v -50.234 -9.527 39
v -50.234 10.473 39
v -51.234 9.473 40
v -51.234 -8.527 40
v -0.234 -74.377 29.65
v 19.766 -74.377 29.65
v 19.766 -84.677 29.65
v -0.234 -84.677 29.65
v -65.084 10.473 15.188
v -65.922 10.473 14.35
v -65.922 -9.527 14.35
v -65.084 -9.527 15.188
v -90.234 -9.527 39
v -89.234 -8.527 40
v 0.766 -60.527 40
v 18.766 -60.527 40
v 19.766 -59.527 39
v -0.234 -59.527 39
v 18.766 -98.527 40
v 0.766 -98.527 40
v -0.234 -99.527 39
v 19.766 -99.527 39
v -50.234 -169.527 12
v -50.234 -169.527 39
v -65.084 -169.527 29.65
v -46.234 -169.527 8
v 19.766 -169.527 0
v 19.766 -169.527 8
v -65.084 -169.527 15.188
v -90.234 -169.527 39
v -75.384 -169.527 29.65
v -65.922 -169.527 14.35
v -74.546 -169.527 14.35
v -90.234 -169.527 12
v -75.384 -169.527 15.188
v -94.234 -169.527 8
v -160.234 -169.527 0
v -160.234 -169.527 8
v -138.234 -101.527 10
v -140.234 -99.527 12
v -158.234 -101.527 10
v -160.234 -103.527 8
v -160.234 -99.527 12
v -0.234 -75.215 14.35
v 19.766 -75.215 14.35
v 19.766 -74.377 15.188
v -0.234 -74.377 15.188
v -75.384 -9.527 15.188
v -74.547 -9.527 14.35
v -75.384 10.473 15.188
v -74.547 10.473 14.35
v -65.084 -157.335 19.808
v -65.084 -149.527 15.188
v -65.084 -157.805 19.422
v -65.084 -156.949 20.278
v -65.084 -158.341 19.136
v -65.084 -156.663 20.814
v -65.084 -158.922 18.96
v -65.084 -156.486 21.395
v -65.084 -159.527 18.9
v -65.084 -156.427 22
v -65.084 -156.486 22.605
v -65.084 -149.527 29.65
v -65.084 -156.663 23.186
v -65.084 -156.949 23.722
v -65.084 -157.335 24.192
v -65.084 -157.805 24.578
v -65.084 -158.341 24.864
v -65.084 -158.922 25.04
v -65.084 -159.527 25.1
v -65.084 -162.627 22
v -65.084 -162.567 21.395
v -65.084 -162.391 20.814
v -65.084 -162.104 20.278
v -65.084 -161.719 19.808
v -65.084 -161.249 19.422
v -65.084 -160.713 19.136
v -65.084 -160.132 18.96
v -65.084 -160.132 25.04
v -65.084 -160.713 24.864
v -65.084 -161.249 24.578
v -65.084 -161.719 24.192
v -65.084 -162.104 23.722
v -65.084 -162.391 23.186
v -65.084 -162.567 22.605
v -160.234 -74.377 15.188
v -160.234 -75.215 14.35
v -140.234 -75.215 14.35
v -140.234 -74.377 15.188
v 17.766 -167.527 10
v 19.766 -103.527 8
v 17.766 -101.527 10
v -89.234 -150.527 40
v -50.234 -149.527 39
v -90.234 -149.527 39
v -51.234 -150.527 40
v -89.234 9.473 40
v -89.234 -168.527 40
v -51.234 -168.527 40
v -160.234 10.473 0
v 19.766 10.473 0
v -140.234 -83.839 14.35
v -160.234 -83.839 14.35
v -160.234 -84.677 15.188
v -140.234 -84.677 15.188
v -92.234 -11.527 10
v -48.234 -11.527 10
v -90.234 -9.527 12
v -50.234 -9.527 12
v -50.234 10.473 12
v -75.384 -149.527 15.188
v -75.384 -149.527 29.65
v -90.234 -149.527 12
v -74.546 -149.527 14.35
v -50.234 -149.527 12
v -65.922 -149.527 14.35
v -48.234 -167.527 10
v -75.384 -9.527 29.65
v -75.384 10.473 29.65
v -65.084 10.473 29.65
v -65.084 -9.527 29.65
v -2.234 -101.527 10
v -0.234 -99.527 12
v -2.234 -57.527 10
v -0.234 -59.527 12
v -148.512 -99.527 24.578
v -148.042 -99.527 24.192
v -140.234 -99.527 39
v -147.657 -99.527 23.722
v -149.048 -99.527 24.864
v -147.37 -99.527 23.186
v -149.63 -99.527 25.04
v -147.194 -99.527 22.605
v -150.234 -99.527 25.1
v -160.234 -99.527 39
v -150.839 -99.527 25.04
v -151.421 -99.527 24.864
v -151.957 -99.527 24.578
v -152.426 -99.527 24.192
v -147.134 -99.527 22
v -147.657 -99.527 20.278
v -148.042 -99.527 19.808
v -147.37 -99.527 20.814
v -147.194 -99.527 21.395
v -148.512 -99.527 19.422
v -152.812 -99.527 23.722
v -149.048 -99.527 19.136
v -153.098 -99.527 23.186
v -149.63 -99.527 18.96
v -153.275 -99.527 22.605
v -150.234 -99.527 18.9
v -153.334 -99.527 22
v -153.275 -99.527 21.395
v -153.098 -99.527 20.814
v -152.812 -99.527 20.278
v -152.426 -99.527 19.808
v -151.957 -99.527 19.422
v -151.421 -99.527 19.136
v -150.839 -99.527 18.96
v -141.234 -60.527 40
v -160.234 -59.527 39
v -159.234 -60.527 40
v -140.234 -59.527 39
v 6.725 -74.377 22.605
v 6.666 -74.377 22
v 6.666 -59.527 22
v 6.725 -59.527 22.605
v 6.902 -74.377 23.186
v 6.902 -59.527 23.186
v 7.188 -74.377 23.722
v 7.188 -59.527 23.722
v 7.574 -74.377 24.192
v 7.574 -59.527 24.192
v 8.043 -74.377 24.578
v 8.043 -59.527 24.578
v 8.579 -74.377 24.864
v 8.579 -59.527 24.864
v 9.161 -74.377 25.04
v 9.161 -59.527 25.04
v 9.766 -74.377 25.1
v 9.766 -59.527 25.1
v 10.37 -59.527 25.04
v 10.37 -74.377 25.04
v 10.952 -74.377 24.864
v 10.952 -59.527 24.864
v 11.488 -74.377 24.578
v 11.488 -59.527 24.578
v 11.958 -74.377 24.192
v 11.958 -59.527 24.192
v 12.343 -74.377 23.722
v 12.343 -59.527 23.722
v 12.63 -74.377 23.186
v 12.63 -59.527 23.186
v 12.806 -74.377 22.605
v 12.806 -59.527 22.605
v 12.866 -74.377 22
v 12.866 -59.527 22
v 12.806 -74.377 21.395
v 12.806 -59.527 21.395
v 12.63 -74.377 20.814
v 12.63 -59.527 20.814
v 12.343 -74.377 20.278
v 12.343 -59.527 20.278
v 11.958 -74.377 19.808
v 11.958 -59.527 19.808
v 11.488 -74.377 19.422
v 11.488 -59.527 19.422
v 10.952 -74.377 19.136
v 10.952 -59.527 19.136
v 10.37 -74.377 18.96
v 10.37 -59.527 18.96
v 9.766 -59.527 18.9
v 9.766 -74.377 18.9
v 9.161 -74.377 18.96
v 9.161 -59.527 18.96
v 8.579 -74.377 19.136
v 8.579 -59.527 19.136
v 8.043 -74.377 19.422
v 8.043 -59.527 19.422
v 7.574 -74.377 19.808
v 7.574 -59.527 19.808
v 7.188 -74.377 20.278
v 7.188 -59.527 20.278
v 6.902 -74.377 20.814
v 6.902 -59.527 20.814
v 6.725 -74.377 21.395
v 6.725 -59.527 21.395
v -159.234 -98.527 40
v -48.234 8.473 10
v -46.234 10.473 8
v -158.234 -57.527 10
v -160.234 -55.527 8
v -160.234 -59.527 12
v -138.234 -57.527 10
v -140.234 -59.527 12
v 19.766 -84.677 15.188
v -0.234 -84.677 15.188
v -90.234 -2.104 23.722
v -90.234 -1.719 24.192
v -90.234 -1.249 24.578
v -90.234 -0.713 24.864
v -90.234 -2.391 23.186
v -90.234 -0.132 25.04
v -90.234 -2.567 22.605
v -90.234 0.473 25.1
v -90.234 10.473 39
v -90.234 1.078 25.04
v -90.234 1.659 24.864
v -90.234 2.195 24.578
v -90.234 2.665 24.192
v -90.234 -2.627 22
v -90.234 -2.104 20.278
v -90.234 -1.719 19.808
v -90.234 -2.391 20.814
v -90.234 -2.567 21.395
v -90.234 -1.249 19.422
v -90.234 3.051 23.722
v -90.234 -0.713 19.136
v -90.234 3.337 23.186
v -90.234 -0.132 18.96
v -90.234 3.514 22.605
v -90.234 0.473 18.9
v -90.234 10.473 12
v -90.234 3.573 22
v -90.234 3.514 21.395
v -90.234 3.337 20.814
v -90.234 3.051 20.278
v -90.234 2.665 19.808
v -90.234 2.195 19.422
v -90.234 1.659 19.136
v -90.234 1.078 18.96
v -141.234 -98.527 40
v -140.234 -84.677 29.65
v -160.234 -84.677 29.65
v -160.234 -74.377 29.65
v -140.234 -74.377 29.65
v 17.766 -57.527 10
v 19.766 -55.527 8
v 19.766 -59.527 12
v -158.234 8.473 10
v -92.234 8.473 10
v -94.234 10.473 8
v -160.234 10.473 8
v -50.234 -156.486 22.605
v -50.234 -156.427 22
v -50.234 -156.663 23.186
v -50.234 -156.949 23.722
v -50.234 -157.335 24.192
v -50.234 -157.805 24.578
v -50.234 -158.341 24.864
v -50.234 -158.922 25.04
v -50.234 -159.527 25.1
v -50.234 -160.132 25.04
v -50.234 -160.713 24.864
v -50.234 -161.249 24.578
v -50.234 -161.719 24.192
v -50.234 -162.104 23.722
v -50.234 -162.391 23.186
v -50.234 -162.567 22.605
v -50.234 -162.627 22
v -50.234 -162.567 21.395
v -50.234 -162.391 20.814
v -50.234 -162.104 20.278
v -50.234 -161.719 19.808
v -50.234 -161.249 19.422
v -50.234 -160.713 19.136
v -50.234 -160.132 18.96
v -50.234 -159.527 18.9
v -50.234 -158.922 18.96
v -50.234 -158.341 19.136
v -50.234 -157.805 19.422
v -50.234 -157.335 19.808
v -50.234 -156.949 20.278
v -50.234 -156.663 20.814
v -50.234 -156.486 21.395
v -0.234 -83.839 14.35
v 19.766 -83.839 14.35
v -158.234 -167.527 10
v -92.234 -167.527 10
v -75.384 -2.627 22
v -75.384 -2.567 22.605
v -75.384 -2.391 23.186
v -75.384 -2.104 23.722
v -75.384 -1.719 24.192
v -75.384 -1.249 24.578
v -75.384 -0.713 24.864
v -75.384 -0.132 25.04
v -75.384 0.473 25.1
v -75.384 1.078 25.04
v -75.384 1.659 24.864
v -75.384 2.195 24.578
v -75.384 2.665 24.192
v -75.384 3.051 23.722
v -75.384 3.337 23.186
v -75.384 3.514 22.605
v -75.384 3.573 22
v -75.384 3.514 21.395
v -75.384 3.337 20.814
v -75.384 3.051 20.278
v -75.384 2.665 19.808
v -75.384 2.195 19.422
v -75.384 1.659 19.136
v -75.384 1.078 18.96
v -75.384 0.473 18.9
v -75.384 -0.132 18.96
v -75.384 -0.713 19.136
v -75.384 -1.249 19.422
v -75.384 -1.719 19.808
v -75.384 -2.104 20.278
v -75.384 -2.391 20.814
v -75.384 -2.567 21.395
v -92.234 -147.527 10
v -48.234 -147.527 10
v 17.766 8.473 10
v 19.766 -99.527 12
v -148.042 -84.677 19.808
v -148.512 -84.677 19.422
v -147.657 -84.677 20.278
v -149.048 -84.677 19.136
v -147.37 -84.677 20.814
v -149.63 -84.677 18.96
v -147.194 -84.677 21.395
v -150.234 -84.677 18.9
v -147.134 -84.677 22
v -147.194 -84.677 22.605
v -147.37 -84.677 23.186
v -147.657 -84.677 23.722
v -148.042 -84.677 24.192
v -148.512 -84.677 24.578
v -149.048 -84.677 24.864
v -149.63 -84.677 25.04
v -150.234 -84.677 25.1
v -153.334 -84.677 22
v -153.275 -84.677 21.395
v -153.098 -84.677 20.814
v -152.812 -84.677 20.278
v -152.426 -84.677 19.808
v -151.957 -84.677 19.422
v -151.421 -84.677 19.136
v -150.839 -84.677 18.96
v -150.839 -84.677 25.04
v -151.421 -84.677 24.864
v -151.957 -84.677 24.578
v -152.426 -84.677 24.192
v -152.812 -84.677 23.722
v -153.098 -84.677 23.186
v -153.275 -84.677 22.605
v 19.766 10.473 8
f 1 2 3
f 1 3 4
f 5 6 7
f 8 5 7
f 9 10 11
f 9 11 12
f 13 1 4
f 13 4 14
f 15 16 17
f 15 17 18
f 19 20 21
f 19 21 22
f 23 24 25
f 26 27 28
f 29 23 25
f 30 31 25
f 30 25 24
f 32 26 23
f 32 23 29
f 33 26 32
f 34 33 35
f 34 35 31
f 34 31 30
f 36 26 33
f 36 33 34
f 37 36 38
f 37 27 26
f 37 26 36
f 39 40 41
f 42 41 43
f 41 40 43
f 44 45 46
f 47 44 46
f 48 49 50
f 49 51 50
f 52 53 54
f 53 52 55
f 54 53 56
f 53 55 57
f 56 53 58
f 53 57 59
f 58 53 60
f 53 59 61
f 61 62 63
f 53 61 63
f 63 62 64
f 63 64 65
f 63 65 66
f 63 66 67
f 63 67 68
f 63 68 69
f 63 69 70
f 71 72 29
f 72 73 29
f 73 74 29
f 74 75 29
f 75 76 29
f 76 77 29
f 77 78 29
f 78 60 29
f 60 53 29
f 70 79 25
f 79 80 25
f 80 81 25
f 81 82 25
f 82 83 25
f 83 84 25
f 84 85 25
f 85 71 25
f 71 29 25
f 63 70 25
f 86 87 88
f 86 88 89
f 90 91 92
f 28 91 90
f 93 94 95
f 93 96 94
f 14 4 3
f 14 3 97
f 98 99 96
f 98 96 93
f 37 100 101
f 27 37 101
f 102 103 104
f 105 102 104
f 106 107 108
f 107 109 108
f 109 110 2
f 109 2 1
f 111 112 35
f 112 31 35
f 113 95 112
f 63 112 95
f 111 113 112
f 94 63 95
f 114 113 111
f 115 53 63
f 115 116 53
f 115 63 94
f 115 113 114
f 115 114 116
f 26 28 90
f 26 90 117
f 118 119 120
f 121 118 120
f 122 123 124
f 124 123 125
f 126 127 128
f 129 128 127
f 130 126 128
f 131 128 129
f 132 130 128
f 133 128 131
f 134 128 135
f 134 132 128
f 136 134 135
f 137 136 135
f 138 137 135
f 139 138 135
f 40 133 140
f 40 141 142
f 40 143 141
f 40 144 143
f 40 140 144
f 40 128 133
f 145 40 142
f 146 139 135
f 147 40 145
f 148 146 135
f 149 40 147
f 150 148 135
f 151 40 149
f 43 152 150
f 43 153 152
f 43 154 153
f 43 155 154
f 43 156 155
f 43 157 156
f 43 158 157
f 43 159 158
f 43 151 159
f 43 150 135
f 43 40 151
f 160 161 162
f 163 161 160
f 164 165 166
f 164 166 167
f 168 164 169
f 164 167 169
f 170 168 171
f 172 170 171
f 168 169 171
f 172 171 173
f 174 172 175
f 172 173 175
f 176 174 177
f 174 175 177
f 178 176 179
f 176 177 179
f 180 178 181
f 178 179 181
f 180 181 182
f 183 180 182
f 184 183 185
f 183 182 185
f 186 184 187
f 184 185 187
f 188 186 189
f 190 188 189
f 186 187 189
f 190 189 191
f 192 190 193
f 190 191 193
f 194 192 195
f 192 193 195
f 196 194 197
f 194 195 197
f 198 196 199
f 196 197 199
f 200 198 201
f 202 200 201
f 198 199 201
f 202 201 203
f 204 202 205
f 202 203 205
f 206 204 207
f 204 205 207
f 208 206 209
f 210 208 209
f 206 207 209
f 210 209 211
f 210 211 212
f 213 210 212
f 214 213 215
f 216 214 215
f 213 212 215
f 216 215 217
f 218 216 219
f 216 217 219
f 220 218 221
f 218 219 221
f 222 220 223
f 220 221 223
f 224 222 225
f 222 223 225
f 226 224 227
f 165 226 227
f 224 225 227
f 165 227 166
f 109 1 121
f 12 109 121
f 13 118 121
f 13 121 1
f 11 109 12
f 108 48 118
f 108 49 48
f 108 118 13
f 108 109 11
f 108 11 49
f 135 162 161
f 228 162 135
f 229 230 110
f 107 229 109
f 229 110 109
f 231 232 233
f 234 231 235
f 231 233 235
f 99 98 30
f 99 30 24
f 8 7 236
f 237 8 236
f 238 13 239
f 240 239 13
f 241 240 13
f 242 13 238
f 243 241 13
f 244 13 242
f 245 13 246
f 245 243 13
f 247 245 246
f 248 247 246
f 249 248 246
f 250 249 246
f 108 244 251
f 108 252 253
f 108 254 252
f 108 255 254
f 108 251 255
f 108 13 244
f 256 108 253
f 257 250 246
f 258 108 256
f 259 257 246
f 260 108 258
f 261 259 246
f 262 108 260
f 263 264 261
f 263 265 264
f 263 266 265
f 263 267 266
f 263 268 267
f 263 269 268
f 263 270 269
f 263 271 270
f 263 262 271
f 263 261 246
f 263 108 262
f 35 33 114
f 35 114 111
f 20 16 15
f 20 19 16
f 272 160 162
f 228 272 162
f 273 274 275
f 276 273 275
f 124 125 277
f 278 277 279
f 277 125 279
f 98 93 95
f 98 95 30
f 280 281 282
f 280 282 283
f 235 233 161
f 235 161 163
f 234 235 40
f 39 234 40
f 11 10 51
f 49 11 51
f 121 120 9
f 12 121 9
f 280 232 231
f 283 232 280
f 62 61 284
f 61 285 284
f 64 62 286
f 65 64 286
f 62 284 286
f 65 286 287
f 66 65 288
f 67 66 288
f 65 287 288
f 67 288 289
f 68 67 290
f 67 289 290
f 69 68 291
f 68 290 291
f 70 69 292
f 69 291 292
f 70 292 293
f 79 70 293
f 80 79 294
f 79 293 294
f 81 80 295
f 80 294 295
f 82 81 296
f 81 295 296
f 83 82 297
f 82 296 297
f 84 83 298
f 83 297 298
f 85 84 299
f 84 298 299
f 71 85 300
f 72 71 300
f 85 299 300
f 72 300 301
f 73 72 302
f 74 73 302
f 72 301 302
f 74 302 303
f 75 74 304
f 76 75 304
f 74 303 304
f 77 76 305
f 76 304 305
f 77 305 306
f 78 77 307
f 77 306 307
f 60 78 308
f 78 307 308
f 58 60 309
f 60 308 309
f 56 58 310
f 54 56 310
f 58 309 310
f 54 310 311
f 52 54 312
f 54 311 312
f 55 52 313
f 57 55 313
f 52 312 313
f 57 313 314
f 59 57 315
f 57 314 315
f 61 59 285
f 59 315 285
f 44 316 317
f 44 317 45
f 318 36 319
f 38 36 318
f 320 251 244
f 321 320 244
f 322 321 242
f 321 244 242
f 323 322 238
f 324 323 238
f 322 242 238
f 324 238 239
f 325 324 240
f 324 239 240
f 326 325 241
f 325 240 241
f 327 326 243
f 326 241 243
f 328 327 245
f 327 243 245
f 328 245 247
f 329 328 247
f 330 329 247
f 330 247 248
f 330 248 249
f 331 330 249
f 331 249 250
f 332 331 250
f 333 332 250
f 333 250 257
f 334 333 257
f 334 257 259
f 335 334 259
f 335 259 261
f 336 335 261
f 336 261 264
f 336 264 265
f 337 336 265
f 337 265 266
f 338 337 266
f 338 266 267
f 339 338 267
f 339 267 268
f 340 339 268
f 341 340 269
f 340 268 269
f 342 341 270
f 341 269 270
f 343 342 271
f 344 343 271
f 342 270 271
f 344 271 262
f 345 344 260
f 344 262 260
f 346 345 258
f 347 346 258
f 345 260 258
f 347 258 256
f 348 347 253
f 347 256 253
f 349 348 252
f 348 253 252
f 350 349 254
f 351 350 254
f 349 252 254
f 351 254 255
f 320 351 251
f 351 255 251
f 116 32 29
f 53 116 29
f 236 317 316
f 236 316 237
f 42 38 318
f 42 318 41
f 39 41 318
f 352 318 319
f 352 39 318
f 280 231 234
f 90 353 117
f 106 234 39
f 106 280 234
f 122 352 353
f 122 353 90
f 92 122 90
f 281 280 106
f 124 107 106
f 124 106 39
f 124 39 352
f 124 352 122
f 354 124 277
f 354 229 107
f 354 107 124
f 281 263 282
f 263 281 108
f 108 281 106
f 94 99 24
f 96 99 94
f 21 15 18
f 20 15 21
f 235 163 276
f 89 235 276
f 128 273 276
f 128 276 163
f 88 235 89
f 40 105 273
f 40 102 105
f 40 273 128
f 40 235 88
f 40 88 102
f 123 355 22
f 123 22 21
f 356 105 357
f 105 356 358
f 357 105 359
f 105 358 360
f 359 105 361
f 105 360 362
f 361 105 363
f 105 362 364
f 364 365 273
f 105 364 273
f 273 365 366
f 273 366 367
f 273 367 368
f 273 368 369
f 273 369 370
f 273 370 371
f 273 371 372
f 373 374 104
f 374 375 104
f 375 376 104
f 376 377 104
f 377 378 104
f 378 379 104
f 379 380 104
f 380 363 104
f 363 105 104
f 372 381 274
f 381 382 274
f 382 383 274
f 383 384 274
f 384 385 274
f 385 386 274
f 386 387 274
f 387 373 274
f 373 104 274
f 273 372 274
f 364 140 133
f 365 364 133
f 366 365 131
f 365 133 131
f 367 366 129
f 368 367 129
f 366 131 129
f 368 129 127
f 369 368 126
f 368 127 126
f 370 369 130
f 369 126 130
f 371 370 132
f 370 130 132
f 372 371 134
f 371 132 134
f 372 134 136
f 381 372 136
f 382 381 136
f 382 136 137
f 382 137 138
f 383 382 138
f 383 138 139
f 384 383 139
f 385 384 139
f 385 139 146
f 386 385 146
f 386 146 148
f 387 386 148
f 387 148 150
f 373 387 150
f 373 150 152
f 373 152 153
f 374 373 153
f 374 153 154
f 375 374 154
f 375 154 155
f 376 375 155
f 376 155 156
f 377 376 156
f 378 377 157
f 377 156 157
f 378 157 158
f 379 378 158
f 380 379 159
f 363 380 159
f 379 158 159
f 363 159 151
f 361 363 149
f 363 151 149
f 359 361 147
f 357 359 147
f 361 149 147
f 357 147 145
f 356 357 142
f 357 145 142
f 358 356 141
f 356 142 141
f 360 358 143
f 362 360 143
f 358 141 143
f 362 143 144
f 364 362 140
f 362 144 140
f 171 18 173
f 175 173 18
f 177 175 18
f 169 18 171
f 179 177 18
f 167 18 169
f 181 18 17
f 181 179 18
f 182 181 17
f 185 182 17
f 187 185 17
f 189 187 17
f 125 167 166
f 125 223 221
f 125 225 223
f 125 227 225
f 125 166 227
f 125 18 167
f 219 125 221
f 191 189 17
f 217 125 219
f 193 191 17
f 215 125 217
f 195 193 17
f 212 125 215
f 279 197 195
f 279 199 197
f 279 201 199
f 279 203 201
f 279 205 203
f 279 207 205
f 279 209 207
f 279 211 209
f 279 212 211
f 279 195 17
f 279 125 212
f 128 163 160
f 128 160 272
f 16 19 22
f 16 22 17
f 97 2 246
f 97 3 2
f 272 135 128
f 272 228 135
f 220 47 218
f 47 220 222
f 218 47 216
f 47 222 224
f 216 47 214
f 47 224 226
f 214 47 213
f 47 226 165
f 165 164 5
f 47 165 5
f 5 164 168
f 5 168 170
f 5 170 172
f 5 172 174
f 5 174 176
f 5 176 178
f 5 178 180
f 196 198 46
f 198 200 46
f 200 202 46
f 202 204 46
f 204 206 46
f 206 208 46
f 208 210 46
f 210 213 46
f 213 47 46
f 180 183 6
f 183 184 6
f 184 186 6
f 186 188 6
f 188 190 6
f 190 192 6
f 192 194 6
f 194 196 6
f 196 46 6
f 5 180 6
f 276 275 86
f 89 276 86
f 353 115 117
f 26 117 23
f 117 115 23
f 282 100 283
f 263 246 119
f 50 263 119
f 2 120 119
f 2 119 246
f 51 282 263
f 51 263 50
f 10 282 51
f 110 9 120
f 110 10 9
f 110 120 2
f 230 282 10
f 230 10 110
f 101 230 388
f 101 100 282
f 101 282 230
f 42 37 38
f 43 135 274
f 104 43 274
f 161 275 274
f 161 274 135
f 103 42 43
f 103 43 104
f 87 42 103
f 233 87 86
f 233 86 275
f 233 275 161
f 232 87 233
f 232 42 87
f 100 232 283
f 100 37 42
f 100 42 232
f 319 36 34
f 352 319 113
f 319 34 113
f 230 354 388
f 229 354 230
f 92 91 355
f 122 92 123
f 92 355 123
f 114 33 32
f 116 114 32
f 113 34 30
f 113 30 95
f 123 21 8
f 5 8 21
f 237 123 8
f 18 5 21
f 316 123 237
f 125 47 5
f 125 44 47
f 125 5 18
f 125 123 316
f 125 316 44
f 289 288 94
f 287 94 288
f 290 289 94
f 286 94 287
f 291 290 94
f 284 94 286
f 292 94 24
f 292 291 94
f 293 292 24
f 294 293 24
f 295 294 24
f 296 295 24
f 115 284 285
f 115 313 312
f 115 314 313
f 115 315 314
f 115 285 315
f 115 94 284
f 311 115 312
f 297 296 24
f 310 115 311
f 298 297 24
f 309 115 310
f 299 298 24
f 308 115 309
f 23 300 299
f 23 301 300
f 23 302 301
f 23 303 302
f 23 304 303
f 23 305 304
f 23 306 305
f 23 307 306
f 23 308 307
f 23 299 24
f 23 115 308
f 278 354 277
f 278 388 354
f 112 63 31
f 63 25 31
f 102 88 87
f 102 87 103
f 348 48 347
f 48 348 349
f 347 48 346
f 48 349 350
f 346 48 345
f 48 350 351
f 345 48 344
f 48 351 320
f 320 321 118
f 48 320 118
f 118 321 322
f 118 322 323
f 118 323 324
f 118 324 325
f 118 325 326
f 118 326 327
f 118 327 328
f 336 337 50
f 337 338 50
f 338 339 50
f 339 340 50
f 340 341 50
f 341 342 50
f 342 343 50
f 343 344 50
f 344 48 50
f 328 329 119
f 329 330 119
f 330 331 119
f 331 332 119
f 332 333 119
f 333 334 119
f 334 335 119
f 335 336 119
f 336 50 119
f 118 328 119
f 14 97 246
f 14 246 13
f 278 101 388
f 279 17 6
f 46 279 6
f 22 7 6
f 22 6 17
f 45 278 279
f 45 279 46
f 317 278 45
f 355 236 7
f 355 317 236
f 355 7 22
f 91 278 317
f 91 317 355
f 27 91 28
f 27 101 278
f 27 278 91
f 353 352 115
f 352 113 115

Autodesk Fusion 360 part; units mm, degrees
sketch "Sketch1" plane through (0, 0, 0) normal (0, 0, 1) x (1, 0, 0)
  line L0 (-160.2344, 10.4731) -> (19.7656, 10.4731)
  line L1 (19.7656, 10.4731) -> (19.7656, -169.5269)
  line L2 (19.7656, -169.5269) -> (-160.2344, -169.5269)
  line L3 (-160.2344, -169.5269) -> (-160.2344, 10.4731)
  dimension "d1" = 180
  dimension "d2" = 180
extrude "Extrude1" add sketch "Sketch1" along normal blind 10
sketch "Sketch2" plane through (0, 0, 10) normal (0, 0, 1) x (-1, 0, 0)
  line L0 (160.2344, 169.5269) -> (-19.7656, 169.5269)
  line L1 (-19.7656, 169.5269) -> (-19.7656, -10.4731)
  line L2 (-19.7656, -10.4731) -> (160.2344, -10.4731)
  line L3 (160.2344, -10.4731) -> (160.2344, 169.5269)
  line L4 (160.2344, 59.5269) -> (140.2344, 59.5269)
  line L5 (140.2344, 59.5269) -> (140.2344, 99.5269)
  line L6 (140.2344, 99.5269) -> (160.2344, 99.5269)
  line L7 (160.2344, 99.5269) -> (160.2344, 59.5269)
  line L8 (0.2344, 59.5269) -> (-19.7656, 59.5269)
  line L9 (-19.7656, 59.5269) -> (-19.7656, 99.5269)
  line L10 (-19.7656, 99.5269) -> (0.2344, 99.5269)
  line L11 (0.2344, 99.5269) -> (0.2344, 59.5269)
  line L12 (90.2344, -10.4731) -> (50.2344, -10.4731)
  line L13 (50.2344, -10.4731) -> (50.2344, 9.5269)
  line L14 (50.2344, 9.5269) -> (90.2344, 9.5269)
  line L15 (90.2344, 9.5269) -> (90.2344, -10.4731)
  line L16 (90.2344, 149.5269) -> (50.2344, 149.5269)
  line L17 (50.2344, 149.5269) -> (50.2344, 169.5269)
  line L18 (50.2344, 169.5269) -> (90.2344, 169.5269)
  line L19 (90.2344, 169.5269) -> (90.2344, 149.5269)
  dimension "d5" = 20
  dimension "d6" = 20
  dimension "d7" = 20
  dimension "d8" = 20
  dimension "d9" = 40
  dimension "d10" = 40
  dimension "d11" = 40
  dimension "d12" = 40
  dimension "d13" = 70
  dimension "d14" = 70
  dimension "d15" = 70
  dimension "d16" = 70
extrude "Extrude2" add sketch "Sketch2" along normal blind 30 contours L0 L16 L17 L18 L19 | L3 L4 L5 L6 L7 | L1 L8 L9 L10 L11 | L2 L12 L13 L14 L15
sketch "Sketch3" plane through (19.7656, 0, 0) normal (1, 0, 0) x (0, 1, 0)
  line L0 (-169.5269, 0) -> (10.4731, 0)
  line L1 (10.4731, 0) -> (10.4731, 10)
  line L2 (10.4731, 10) -> (-59.5269, 10)
  line L3 (-59.5269, 10) -> (-59.5269, 40)
  line L4 (-59.5269, 40) -> (-99.5269, 40)
  line L5 (-99.5269, 40) -> (-99.5269, 10)
  line L6 (-99.5269, 10) -> (-169.5269, 10)
  line L7 (-169.5269, 10) -> (-169.5269, 0)
  circle A0 centre (-79.5269, 22) radius 6 construction
  line L8 (-74.5269, 29.5) -> (-84.5269, 29.5) construction
  line L9 (-84.5269, 29.5) -> (-84.5269, 15.25) construction
  line L10 (-83.7769, 14.5) -> (-75.2769, 14.5) construction
  line L11 (-74.5269, 15.25) -> (-74.5269, 29.5) construction
  line L12 (-74.5269, 29.5) -> (-84.5269, 14.5) construction
  line L13 (-84.5269, 29.5) -> (-74.5269, 14.5) construction
  line L14 (-83.7769, 14.5) -> (-84.5269, 15.25)
  line L15 (-75.2769, 14.5) -> (-74.5269, 15.25)
  line L16 (-83.839, 14.35) -> (-75.2147, 14.35)
  line L17 (-75.2147, 14.35) -> (-74.3769, 15.1879)
  line L18 (-74.3769, 15.1879) -> (-74.3769, 29.65)
  line L19 (-74.3769, 29.65) -> (-84.6769, 29.65)
  line L20 (-84.6769, 29.65) -> (-84.6769, 15.1879)
  line L21 (-83.839, 14.35) -> (-84.6769, 15.1879)
  point P0 (-79.5269, 22)
  dimension "d19" = 12
  dimension "d20" = 18
  dimension "d21" = 20
  dimension "d36" = 10
  dimension "d37" = 15
  dimension "d38" = 0.15
  dimension "d39" = 0.75
  dimension "d40" = 0.75
  dimension "d41" = 0.75
  dimension "d42" = 0.75
extrude "Extrude3" cut sketch "Sketch3" against normal blind 30 contours L16 L17 L18 L19 L20 L21
ref_plane "WorkPlane1" through (-70.2344, -79.5269, 20) normal (0, -1, 0) x (1, 0, 0)
ref_plane "WorkPlane2" through (-70.2344, -79.5269, 20) normal (1, 0, 0) x (0, 1, 0)
pattern_circular "C-Pattern1" count 4 over 360 about axis through (-70.2344, -79.5269, -13.6) along (0, 0, 1) of "Extrude3"
sketch "Sketch4" plane through (0, -59.5269, 0) normal (0, 1, 0) x (-1, 0, 0)
  line L0 (-19.7656, 10) -> (0.2344, 10)
  line L1 (0.2344, 10) -> (0.2344, 40)
  line L2 (0.2344, 40) -> (-19.7656, 40)
  line L3 (-19.7656, 40) -> (-19.7656, 10)
  circle A0 centre (-9.7656, 22) radius 3.1
  dimension "d26" = 6.2
  dimension "d27" = 18
  dimension "d28" = 10
extrude "Extrude4" cut sketch "Sketch4" against normal blind 20 contours A0
pattern_circular "C-Pattern2" count 4 over 360 about axis through (-70.2344, -79.5269, -13.6) along (0, 0, 1) of "Extrude4"
chamfer "Chamfer1" distance 1 angle 45 16 edges at (-0.2344, -79.5269, 40) (9.7656, -99.5269, 40) (19.7656, -79.5269, 40) (9.7656, -59.5269, 40) (-70.2344, 10.4731, 40) (-70.2344, -9.5269, 40) (-50.2344, 0.4731, 40) (-90.2344, 0.4731, 40) (-150.2344, -59.5269, 40) (-140.2344, -79.5269, 40) (-160.2344, -79.5269, 40) (-150.2344, -99.5269, 40) (-90.2344, -159.5269, 40) (-70.2344, -149.5269, 40) (-70.2344, -169.5269, 40) (-50.2344, -159.5269, 40)
chamfer "Chamfer2" distance 2 angle 45 12 edges at (-140.2344, -79.5269, 10) (-150.2344, -99.5269, 10) (-150.2344, -59.5269, 10) (-70.2344, -149.5269, 10) (-90.2344, -159.5269, 10) (-90.2344, 0.4731, 10) (-70.2344, -9.5269, 10) (-0.2344, -79.5269, 10) (9.7656, -99.5269, 10) (-50.2344, -159.5269, 10) (9.7656, -59.5269, 10) (-50.2344, 0.4731, 10)
chamfer "Chamfer3" distance 2 angle 45 8 edges at (-126.2344, 10.4731, 10) (-160.2344, -23.5269, 10) (19.7656, -23.5269, 10) (19.7656, -135.5269, 10) (-14.2344, -169.5269, 10) (-14.2344, 10.4731, 10) (-126.2344, -169.5269, 10) (-160.2344, -135.5269, 10)
equation "d40 = d39"
equation "d42 = d41"
